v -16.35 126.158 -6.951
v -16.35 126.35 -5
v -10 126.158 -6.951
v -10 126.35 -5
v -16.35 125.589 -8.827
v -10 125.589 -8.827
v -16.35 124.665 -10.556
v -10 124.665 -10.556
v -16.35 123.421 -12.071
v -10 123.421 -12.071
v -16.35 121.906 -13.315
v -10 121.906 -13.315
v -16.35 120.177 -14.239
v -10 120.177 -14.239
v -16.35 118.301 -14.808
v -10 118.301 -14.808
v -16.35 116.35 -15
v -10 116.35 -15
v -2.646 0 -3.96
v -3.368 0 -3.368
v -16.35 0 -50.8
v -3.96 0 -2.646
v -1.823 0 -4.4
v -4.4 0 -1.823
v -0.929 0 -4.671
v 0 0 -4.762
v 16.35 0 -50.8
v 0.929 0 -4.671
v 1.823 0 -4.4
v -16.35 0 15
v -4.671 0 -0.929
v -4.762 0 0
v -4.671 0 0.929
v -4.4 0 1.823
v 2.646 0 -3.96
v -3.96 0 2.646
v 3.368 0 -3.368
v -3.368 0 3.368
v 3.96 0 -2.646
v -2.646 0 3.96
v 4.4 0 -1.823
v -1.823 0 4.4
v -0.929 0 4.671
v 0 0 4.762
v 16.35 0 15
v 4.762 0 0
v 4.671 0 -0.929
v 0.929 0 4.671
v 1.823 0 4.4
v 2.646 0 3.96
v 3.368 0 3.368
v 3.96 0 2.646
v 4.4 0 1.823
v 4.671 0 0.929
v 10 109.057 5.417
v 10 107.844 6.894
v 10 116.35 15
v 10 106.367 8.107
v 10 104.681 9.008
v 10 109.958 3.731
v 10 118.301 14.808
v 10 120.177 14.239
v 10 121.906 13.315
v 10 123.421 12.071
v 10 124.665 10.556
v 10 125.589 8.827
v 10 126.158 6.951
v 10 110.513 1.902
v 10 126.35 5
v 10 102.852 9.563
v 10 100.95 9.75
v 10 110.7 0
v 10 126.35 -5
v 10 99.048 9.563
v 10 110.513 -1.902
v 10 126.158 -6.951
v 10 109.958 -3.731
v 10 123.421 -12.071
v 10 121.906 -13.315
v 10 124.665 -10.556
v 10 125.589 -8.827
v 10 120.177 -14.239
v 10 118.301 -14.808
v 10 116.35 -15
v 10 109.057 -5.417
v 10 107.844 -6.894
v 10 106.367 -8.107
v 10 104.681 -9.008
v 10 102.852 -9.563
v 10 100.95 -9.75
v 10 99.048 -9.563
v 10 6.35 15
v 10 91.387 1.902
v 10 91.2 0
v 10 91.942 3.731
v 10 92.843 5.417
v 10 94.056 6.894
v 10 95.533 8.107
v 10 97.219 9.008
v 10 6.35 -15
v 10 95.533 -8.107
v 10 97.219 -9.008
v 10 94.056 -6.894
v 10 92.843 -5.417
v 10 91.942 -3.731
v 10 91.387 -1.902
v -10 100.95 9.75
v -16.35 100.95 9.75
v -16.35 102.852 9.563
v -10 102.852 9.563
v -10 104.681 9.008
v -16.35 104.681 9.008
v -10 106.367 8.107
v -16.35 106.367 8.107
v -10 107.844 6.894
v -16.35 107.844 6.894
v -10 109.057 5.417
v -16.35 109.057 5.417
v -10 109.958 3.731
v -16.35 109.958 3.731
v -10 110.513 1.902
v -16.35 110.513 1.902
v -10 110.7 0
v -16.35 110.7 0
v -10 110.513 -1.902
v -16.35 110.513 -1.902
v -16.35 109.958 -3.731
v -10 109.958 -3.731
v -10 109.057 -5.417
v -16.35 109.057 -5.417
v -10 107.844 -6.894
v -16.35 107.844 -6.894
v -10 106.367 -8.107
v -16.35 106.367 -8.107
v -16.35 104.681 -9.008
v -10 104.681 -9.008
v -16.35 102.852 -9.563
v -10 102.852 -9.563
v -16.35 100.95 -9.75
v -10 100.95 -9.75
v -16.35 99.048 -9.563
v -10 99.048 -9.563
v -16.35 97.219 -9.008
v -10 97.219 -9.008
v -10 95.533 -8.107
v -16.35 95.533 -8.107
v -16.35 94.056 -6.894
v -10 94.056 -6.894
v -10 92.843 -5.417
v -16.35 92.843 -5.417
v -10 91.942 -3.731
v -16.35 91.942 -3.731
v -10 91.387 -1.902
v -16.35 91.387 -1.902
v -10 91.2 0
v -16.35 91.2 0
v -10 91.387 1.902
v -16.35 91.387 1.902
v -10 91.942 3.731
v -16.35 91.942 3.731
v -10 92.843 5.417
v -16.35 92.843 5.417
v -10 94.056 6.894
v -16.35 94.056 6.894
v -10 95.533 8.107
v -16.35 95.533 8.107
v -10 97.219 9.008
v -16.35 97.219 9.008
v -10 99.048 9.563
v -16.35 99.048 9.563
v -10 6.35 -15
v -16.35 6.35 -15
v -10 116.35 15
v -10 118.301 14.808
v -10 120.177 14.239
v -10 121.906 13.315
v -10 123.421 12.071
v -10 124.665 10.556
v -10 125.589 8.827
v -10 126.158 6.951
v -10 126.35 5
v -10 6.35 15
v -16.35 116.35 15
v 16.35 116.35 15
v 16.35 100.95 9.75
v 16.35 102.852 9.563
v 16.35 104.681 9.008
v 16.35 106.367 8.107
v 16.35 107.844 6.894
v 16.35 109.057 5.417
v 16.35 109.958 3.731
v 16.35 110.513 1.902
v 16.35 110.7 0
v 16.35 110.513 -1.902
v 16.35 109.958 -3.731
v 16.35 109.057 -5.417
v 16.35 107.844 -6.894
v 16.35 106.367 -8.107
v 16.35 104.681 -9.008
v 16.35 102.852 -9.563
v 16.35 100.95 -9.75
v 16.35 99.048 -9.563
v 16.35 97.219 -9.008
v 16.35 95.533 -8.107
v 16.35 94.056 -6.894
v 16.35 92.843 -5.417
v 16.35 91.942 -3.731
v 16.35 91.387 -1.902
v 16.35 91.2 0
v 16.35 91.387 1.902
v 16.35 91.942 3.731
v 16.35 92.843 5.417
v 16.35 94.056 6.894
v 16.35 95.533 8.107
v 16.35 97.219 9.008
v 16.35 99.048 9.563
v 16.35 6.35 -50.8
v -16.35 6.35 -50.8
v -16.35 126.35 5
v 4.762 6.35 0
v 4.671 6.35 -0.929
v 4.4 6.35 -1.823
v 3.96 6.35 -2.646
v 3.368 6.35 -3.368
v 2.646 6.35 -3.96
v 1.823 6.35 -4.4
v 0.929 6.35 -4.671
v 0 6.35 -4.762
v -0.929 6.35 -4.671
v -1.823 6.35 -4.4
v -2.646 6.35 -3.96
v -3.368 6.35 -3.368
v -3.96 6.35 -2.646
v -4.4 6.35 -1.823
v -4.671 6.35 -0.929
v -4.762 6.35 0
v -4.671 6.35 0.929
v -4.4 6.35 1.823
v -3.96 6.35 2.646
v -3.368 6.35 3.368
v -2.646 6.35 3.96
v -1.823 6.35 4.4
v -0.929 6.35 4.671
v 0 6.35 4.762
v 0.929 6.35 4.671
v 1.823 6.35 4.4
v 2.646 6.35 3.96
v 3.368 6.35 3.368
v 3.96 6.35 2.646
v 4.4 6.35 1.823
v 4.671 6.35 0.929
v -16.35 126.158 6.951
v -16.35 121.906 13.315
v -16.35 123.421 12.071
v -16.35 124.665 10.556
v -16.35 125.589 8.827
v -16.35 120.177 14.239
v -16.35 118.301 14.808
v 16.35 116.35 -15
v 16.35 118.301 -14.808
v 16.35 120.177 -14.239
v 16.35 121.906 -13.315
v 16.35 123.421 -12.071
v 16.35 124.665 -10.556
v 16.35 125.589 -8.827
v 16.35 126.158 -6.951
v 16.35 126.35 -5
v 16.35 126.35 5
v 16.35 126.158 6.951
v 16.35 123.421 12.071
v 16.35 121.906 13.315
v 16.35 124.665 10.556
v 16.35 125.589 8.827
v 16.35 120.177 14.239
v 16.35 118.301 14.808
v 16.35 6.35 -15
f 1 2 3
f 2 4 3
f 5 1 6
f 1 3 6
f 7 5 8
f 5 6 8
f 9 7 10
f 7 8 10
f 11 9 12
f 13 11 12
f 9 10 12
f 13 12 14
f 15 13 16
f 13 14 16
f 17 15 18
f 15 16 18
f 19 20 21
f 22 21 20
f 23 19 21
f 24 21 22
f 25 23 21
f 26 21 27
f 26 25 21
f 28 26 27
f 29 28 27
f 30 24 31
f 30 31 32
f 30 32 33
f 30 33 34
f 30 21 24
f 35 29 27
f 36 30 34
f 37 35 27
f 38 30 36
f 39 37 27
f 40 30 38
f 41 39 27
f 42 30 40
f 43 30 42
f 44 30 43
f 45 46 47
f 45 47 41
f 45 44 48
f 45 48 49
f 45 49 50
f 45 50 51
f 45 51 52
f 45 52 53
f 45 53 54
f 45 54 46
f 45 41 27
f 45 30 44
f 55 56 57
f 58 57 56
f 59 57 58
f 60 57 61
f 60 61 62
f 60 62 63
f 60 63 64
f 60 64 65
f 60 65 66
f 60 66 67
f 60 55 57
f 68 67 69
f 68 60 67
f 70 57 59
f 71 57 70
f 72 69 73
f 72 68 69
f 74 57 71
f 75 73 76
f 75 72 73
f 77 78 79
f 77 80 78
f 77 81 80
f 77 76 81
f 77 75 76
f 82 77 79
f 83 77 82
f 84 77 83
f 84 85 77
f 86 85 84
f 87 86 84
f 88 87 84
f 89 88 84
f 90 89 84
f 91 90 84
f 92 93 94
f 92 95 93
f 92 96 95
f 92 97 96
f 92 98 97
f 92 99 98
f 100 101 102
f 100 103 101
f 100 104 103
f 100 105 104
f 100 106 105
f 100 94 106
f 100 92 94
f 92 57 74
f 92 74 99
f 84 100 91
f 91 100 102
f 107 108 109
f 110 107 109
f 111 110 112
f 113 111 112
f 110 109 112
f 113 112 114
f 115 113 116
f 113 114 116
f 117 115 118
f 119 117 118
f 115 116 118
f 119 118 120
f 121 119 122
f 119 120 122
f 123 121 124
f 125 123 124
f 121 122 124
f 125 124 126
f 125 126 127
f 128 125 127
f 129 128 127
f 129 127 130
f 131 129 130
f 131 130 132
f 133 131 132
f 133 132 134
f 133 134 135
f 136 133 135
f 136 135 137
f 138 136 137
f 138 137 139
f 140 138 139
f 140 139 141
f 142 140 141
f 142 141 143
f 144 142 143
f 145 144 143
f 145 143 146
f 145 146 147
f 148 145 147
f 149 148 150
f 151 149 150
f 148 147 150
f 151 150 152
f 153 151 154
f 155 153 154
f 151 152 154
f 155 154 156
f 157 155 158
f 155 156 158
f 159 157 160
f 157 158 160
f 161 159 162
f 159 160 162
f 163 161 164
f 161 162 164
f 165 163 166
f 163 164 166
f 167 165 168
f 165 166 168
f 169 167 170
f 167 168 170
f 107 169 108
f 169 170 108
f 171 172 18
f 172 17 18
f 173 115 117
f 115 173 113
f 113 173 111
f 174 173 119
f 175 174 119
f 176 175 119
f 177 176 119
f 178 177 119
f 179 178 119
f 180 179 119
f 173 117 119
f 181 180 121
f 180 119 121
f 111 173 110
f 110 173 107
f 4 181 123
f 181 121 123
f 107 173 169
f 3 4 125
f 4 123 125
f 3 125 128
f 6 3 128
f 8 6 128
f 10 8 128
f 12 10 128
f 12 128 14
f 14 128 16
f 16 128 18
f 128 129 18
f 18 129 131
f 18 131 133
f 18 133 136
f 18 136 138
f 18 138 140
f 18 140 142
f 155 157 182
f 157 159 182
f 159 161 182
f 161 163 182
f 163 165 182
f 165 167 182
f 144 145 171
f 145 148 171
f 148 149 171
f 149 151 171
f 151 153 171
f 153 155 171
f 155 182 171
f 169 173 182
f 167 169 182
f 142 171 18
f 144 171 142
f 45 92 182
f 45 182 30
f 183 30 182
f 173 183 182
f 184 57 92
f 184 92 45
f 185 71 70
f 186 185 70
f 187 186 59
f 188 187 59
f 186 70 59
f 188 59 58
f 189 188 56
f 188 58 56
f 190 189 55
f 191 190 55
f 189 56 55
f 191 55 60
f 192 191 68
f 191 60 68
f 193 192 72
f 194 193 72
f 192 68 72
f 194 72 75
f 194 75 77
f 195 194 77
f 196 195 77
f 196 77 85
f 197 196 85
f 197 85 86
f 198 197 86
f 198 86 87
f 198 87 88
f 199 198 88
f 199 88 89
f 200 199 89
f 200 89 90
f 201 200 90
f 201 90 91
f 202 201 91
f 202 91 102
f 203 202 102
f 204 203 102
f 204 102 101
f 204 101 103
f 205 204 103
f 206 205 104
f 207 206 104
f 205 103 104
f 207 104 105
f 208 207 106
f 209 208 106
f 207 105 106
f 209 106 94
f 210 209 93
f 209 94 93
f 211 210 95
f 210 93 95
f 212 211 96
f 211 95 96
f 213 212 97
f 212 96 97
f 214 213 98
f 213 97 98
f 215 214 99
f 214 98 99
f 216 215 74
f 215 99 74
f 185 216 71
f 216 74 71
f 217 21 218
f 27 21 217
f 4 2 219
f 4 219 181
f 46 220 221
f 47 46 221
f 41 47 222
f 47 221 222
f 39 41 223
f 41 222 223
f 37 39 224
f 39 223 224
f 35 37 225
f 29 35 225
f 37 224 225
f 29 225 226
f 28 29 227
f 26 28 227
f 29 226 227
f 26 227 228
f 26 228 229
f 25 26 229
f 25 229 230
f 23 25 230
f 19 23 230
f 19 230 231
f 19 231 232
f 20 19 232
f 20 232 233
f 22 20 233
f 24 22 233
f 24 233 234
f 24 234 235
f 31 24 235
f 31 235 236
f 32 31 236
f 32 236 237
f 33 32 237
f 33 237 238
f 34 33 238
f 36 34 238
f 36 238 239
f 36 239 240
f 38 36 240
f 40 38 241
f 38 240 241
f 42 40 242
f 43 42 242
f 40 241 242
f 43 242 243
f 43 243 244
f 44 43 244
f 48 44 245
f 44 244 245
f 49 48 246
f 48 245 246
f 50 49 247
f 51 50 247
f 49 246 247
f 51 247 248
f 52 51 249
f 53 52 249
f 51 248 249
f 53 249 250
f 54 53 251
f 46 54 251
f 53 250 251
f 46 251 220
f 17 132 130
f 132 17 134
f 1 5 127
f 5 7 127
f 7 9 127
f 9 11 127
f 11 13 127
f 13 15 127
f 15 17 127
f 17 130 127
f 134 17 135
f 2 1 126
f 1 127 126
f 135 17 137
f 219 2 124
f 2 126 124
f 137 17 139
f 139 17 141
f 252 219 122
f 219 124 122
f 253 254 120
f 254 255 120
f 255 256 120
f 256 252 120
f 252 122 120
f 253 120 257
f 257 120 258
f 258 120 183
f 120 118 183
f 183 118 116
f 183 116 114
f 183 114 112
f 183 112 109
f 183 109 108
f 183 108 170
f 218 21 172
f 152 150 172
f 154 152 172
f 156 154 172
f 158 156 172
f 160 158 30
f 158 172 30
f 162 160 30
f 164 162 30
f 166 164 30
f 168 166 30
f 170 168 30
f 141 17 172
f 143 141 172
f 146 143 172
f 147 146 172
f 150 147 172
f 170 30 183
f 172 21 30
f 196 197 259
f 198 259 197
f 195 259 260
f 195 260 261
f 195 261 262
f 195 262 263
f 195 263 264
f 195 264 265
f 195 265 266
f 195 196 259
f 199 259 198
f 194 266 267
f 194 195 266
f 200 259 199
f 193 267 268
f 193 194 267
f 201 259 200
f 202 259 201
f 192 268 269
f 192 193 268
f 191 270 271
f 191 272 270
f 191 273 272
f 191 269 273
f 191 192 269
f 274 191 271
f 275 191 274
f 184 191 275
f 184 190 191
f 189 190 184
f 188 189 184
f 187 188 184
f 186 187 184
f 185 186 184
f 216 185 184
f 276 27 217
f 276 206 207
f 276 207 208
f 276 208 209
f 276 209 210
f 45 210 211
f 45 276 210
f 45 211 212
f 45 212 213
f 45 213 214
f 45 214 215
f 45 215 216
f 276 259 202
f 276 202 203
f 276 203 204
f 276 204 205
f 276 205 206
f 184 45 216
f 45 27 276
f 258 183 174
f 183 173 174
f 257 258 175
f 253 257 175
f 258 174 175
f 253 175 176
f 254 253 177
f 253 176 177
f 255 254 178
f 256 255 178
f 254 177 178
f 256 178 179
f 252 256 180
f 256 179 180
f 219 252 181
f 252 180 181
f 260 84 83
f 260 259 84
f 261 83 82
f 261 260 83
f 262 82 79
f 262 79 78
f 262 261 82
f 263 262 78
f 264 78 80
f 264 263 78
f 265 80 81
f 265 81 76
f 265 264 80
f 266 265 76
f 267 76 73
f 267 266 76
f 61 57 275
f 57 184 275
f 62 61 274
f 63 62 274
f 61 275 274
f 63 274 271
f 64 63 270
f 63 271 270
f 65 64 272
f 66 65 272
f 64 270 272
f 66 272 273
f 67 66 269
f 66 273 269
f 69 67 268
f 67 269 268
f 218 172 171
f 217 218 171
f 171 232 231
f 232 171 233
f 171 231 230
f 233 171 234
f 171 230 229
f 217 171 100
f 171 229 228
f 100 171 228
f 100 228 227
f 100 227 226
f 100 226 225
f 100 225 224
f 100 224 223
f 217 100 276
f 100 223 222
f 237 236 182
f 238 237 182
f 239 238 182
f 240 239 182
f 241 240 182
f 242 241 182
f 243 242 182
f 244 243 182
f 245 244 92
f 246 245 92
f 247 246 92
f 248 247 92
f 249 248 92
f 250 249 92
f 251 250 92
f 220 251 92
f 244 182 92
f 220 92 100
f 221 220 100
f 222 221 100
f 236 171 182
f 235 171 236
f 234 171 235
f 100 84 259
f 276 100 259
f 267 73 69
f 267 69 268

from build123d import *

# Parameters (mm, degrees)
SKETCH1_R                = 10
BOSS_EXTRUDE1_DEPTH      = 6.35
SKETCH5_W                = 20
SKETCH5_H                = 30
BOSS_EXTRUDE2_DEPTH      = 6.35
SKETCH7_W                = 6.35
SKETCH7_H                = 30
BOSS_EXTRUDE3_DEPTH      = 120
BOSS_EXTRUDE3_DEPTH_BACK = 6.35
SKETCH8_R                = 9.75
CUT_EXTRUDE2_DEPTH       = 33.7
SKETCH2_R                = 4.7625
CUT_EXTRUDE1_DEPTH       = 7.35
FILLET2_R                = 10
SKETCH11_W               = 32.7
SKETCH11_H               = 35.8
BOSS_EXTRUDE5_DEPTH      = 6.35


with BuildPart() as part:
    # Sketch1 → Boss-Extrude1 (new body)
    with BuildSketch(Plane(origin=(0, 0, 0), x_dir=(1, 0, 0), z_dir=(0, 1, 0))):
        Circle(SKETCH1_R)
    extrude(amount=BOSS_EXTRUDE1_DEPTH)

    # Sketch5 → Boss-Extrude2 (add)
    with BuildSketch(Plane(origin=(0, 6.35, 0), x_dir=(1, 0, 0), z_dir=(0, 1, 0))):
        Rectangle(SKETCH5_W, SKETCH5_H)
    extrude(amount=-BOSS_EXTRUDE2_DEPTH)

    # Sketch7 → Boss-Extrude3 (add, two sides)
    with BuildSketch(Plane(origin=(0, 6.35, 0), x_dir=(1, 0, 0), z_dir=(0, 1, 0))) as boss_extrude3_sk:
        with Locations((-13.175, 0)):
            Rectangle(SKETCH7_W, SKETCH7_H)
        with Locations((13.175, 0)):
            Rectangle(SKETCH7_W, SKETCH7_H)
    extrude(amount=BOSS_EXTRUDE3_DEPTH)
    extrude(boss_extrude3_sk.sketch, amount=-BOSS_EXTRUDE3_DEPTH_BACK)

    # Sketch8 → Cut-Extrude2 (cut, through all)
    with BuildSketch(Plane.ZY.offset(16.35)):
        with Locations((0, 100.95)):
            Circle(SKETCH8_R)
    extrude(amount=-CUT_EXTRUDE2_DEPTH, mode=Mode.SUBTRACT)

    # Sketch2 → Cut-Extrude1 (cut, through all)
    with BuildSketch(Plane(origin=(0, 6.35, 0), x_dir=(1, 0, 0), z_dir=(0, 1, 0))):
        Circle(SKETCH2_R)
    extrude(amount=-CUT_EXTRUDE1_DEPTH, mode=Mode.SUBTRACT)

    # Fillet2
    fillet2_edges = [part.edges().sort_by_distance(p)[0] for p in [
        (13.175, 126.35, -15),
        (13.175, 126.35, 15),
        (-13.175, 126.35, 15),
        (-13.175, 126.35, -15),
    ]]
    fillet(fillet2_edges, radius=FILLET2_R)

    # Sketch11 → Boss-Extrude5 (add)
    with BuildSketch(Plane.XZ):
        with Locations((0, -32.9)):
            Rectangle(SKETCH11_W, SKETCH11_H)
    extrude(amount=-BOSS_EXTRUDE5_DEPTH)


solid = part.part
